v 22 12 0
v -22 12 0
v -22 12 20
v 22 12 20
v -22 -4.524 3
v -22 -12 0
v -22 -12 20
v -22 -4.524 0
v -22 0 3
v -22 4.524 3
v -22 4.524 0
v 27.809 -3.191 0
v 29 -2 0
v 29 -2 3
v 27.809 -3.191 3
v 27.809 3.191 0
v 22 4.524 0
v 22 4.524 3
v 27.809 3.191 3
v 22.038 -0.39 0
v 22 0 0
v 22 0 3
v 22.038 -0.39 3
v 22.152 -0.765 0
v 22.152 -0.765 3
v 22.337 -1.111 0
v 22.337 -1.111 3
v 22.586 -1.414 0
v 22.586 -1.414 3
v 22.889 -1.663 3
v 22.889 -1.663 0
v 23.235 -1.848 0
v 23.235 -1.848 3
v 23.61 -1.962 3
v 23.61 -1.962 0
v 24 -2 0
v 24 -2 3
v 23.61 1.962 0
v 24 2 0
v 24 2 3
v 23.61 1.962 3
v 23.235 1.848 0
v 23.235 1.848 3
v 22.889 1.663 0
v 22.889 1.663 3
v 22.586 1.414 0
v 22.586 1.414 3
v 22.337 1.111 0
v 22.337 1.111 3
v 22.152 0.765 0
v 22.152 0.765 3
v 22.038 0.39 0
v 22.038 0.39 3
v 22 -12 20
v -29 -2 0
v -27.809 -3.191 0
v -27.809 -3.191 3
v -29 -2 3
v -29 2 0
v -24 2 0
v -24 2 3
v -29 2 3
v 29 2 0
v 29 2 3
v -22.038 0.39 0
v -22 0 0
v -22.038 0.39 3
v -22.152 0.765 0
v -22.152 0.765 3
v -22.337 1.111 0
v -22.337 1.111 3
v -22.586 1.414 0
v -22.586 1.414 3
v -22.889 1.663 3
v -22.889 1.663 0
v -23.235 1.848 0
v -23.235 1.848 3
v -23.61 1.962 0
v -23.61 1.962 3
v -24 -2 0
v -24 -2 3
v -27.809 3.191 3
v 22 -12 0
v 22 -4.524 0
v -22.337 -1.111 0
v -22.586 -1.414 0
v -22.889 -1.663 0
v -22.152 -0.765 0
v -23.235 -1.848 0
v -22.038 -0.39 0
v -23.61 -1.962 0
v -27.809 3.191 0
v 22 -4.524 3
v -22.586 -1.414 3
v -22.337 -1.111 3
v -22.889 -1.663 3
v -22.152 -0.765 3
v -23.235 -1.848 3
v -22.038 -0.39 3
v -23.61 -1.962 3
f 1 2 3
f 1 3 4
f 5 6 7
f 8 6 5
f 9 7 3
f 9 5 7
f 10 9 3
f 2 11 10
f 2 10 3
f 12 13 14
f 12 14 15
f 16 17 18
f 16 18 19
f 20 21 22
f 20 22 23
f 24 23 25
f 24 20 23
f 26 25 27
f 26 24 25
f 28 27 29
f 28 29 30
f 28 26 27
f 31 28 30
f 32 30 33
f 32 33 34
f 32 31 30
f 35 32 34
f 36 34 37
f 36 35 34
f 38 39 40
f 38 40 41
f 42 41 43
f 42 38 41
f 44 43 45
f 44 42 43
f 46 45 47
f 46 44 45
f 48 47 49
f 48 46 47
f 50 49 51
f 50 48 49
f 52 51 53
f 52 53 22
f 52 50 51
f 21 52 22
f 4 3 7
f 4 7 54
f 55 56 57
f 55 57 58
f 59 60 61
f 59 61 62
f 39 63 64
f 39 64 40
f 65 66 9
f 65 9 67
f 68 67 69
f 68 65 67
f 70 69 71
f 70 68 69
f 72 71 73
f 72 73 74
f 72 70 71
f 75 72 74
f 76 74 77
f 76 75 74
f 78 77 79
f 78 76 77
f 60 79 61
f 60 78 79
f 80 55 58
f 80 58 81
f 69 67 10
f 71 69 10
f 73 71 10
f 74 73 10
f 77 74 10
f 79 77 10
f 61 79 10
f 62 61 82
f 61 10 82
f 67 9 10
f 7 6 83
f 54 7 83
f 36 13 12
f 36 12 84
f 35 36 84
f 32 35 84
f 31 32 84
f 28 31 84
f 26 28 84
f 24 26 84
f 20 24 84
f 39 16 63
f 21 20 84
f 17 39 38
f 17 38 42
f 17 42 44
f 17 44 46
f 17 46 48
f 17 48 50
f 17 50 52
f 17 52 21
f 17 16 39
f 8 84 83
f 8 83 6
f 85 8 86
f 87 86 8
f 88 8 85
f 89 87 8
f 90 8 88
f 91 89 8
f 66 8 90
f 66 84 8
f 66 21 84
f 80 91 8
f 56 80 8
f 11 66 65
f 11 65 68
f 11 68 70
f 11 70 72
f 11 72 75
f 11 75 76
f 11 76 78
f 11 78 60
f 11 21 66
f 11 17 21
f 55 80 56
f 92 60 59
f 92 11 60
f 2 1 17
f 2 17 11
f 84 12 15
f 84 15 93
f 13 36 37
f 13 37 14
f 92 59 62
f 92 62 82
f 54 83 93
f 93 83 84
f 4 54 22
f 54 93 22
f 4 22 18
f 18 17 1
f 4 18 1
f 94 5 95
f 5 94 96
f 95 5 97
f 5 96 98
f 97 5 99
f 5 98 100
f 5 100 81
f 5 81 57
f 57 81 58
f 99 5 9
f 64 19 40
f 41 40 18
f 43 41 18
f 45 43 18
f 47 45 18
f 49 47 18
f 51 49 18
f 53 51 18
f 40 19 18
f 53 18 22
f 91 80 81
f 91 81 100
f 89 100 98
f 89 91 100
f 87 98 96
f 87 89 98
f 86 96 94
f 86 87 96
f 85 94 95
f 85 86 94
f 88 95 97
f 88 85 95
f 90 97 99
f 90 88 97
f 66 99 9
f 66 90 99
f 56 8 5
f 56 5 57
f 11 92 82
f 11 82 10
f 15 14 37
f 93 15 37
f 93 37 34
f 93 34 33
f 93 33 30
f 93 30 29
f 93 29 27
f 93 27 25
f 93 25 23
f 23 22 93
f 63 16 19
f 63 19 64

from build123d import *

# Parameters (mm, degrees)
SKETCH_1_W      = 44
SKETCH_1_H      = 24
EXTRUDE_1_DEPTH = 20
EXTRUDE_2_DEPTH = 3


with BuildPart() as part:
    # 草图1 → 凸台-拉伸1 (new body)
    with BuildSketch(Plane.XY):
        Rectangle(SKETCH_1_W, SKETCH_1_H)
    extrude(amount=EXTRUDE_1_DEPTH)

    # 草图2 → 凸台-拉伸2 (add)
    with BuildSketch(Plane(origin=(0, 0, 0), x_dir=(-1, 0, 0), z_dir=(0, 0, -1))):
        with BuildLine():
            Line((22, 4.523639819), (22, -1e-08))
            ThreePointArc((22, -1e-08), (22.585786434, 1.414213559), (24, 2))
            Line((24, 2), (29, 2))
            Line((29, 2), (27.809223998, 3.190776002))
            Line((27.809223998, 3.190776002), (22, 4.523639819))
        make_face()
        with BuildLine():
            Line((22, -4.523639819), (27.809223998, -3.190776002))
            Line((27.809223998, -3.190776002), (29, -2))
            Line((29, -2), (24, -2))
            ThreePointArc((24, -2), (22.585786441, -1.414213566), (22, -1e-08))
            Line((22, -1e-08), (22, -4.523639819))
        make_face()
        with BuildLine():
            Line((-27.809223998, 3.190776002), (-29, 2))
            Line((-29, 2), (-24, 2))
            ThreePointArc((-24, 2), (-22.585786447, 1.414213572), (-22, 2.8e-08))
            Line((-22, 2.8e-08), (-22, 4.523639819))
            Line((-22, 4.523639819), (-27.809223998, 3.190776002))
        make_face()
        with BuildLine():
            Line((-22, -4.523639819), (-22, 2.8e-08))
            ThreePointArc((-22, 2.8e-08), (-22.585786428, -1.414213553), (-24, -2))
            Line((-24, -2), (-29, -2))
            Line((-29, -2), (-27.809223998, -3.190776002))
            Line((-27.809223998, -3.190776002), (-22, -4.523639819))
        make_face()
    extrude(amount=-EXTRUDE_2_DEPTH)


solid = part.part
